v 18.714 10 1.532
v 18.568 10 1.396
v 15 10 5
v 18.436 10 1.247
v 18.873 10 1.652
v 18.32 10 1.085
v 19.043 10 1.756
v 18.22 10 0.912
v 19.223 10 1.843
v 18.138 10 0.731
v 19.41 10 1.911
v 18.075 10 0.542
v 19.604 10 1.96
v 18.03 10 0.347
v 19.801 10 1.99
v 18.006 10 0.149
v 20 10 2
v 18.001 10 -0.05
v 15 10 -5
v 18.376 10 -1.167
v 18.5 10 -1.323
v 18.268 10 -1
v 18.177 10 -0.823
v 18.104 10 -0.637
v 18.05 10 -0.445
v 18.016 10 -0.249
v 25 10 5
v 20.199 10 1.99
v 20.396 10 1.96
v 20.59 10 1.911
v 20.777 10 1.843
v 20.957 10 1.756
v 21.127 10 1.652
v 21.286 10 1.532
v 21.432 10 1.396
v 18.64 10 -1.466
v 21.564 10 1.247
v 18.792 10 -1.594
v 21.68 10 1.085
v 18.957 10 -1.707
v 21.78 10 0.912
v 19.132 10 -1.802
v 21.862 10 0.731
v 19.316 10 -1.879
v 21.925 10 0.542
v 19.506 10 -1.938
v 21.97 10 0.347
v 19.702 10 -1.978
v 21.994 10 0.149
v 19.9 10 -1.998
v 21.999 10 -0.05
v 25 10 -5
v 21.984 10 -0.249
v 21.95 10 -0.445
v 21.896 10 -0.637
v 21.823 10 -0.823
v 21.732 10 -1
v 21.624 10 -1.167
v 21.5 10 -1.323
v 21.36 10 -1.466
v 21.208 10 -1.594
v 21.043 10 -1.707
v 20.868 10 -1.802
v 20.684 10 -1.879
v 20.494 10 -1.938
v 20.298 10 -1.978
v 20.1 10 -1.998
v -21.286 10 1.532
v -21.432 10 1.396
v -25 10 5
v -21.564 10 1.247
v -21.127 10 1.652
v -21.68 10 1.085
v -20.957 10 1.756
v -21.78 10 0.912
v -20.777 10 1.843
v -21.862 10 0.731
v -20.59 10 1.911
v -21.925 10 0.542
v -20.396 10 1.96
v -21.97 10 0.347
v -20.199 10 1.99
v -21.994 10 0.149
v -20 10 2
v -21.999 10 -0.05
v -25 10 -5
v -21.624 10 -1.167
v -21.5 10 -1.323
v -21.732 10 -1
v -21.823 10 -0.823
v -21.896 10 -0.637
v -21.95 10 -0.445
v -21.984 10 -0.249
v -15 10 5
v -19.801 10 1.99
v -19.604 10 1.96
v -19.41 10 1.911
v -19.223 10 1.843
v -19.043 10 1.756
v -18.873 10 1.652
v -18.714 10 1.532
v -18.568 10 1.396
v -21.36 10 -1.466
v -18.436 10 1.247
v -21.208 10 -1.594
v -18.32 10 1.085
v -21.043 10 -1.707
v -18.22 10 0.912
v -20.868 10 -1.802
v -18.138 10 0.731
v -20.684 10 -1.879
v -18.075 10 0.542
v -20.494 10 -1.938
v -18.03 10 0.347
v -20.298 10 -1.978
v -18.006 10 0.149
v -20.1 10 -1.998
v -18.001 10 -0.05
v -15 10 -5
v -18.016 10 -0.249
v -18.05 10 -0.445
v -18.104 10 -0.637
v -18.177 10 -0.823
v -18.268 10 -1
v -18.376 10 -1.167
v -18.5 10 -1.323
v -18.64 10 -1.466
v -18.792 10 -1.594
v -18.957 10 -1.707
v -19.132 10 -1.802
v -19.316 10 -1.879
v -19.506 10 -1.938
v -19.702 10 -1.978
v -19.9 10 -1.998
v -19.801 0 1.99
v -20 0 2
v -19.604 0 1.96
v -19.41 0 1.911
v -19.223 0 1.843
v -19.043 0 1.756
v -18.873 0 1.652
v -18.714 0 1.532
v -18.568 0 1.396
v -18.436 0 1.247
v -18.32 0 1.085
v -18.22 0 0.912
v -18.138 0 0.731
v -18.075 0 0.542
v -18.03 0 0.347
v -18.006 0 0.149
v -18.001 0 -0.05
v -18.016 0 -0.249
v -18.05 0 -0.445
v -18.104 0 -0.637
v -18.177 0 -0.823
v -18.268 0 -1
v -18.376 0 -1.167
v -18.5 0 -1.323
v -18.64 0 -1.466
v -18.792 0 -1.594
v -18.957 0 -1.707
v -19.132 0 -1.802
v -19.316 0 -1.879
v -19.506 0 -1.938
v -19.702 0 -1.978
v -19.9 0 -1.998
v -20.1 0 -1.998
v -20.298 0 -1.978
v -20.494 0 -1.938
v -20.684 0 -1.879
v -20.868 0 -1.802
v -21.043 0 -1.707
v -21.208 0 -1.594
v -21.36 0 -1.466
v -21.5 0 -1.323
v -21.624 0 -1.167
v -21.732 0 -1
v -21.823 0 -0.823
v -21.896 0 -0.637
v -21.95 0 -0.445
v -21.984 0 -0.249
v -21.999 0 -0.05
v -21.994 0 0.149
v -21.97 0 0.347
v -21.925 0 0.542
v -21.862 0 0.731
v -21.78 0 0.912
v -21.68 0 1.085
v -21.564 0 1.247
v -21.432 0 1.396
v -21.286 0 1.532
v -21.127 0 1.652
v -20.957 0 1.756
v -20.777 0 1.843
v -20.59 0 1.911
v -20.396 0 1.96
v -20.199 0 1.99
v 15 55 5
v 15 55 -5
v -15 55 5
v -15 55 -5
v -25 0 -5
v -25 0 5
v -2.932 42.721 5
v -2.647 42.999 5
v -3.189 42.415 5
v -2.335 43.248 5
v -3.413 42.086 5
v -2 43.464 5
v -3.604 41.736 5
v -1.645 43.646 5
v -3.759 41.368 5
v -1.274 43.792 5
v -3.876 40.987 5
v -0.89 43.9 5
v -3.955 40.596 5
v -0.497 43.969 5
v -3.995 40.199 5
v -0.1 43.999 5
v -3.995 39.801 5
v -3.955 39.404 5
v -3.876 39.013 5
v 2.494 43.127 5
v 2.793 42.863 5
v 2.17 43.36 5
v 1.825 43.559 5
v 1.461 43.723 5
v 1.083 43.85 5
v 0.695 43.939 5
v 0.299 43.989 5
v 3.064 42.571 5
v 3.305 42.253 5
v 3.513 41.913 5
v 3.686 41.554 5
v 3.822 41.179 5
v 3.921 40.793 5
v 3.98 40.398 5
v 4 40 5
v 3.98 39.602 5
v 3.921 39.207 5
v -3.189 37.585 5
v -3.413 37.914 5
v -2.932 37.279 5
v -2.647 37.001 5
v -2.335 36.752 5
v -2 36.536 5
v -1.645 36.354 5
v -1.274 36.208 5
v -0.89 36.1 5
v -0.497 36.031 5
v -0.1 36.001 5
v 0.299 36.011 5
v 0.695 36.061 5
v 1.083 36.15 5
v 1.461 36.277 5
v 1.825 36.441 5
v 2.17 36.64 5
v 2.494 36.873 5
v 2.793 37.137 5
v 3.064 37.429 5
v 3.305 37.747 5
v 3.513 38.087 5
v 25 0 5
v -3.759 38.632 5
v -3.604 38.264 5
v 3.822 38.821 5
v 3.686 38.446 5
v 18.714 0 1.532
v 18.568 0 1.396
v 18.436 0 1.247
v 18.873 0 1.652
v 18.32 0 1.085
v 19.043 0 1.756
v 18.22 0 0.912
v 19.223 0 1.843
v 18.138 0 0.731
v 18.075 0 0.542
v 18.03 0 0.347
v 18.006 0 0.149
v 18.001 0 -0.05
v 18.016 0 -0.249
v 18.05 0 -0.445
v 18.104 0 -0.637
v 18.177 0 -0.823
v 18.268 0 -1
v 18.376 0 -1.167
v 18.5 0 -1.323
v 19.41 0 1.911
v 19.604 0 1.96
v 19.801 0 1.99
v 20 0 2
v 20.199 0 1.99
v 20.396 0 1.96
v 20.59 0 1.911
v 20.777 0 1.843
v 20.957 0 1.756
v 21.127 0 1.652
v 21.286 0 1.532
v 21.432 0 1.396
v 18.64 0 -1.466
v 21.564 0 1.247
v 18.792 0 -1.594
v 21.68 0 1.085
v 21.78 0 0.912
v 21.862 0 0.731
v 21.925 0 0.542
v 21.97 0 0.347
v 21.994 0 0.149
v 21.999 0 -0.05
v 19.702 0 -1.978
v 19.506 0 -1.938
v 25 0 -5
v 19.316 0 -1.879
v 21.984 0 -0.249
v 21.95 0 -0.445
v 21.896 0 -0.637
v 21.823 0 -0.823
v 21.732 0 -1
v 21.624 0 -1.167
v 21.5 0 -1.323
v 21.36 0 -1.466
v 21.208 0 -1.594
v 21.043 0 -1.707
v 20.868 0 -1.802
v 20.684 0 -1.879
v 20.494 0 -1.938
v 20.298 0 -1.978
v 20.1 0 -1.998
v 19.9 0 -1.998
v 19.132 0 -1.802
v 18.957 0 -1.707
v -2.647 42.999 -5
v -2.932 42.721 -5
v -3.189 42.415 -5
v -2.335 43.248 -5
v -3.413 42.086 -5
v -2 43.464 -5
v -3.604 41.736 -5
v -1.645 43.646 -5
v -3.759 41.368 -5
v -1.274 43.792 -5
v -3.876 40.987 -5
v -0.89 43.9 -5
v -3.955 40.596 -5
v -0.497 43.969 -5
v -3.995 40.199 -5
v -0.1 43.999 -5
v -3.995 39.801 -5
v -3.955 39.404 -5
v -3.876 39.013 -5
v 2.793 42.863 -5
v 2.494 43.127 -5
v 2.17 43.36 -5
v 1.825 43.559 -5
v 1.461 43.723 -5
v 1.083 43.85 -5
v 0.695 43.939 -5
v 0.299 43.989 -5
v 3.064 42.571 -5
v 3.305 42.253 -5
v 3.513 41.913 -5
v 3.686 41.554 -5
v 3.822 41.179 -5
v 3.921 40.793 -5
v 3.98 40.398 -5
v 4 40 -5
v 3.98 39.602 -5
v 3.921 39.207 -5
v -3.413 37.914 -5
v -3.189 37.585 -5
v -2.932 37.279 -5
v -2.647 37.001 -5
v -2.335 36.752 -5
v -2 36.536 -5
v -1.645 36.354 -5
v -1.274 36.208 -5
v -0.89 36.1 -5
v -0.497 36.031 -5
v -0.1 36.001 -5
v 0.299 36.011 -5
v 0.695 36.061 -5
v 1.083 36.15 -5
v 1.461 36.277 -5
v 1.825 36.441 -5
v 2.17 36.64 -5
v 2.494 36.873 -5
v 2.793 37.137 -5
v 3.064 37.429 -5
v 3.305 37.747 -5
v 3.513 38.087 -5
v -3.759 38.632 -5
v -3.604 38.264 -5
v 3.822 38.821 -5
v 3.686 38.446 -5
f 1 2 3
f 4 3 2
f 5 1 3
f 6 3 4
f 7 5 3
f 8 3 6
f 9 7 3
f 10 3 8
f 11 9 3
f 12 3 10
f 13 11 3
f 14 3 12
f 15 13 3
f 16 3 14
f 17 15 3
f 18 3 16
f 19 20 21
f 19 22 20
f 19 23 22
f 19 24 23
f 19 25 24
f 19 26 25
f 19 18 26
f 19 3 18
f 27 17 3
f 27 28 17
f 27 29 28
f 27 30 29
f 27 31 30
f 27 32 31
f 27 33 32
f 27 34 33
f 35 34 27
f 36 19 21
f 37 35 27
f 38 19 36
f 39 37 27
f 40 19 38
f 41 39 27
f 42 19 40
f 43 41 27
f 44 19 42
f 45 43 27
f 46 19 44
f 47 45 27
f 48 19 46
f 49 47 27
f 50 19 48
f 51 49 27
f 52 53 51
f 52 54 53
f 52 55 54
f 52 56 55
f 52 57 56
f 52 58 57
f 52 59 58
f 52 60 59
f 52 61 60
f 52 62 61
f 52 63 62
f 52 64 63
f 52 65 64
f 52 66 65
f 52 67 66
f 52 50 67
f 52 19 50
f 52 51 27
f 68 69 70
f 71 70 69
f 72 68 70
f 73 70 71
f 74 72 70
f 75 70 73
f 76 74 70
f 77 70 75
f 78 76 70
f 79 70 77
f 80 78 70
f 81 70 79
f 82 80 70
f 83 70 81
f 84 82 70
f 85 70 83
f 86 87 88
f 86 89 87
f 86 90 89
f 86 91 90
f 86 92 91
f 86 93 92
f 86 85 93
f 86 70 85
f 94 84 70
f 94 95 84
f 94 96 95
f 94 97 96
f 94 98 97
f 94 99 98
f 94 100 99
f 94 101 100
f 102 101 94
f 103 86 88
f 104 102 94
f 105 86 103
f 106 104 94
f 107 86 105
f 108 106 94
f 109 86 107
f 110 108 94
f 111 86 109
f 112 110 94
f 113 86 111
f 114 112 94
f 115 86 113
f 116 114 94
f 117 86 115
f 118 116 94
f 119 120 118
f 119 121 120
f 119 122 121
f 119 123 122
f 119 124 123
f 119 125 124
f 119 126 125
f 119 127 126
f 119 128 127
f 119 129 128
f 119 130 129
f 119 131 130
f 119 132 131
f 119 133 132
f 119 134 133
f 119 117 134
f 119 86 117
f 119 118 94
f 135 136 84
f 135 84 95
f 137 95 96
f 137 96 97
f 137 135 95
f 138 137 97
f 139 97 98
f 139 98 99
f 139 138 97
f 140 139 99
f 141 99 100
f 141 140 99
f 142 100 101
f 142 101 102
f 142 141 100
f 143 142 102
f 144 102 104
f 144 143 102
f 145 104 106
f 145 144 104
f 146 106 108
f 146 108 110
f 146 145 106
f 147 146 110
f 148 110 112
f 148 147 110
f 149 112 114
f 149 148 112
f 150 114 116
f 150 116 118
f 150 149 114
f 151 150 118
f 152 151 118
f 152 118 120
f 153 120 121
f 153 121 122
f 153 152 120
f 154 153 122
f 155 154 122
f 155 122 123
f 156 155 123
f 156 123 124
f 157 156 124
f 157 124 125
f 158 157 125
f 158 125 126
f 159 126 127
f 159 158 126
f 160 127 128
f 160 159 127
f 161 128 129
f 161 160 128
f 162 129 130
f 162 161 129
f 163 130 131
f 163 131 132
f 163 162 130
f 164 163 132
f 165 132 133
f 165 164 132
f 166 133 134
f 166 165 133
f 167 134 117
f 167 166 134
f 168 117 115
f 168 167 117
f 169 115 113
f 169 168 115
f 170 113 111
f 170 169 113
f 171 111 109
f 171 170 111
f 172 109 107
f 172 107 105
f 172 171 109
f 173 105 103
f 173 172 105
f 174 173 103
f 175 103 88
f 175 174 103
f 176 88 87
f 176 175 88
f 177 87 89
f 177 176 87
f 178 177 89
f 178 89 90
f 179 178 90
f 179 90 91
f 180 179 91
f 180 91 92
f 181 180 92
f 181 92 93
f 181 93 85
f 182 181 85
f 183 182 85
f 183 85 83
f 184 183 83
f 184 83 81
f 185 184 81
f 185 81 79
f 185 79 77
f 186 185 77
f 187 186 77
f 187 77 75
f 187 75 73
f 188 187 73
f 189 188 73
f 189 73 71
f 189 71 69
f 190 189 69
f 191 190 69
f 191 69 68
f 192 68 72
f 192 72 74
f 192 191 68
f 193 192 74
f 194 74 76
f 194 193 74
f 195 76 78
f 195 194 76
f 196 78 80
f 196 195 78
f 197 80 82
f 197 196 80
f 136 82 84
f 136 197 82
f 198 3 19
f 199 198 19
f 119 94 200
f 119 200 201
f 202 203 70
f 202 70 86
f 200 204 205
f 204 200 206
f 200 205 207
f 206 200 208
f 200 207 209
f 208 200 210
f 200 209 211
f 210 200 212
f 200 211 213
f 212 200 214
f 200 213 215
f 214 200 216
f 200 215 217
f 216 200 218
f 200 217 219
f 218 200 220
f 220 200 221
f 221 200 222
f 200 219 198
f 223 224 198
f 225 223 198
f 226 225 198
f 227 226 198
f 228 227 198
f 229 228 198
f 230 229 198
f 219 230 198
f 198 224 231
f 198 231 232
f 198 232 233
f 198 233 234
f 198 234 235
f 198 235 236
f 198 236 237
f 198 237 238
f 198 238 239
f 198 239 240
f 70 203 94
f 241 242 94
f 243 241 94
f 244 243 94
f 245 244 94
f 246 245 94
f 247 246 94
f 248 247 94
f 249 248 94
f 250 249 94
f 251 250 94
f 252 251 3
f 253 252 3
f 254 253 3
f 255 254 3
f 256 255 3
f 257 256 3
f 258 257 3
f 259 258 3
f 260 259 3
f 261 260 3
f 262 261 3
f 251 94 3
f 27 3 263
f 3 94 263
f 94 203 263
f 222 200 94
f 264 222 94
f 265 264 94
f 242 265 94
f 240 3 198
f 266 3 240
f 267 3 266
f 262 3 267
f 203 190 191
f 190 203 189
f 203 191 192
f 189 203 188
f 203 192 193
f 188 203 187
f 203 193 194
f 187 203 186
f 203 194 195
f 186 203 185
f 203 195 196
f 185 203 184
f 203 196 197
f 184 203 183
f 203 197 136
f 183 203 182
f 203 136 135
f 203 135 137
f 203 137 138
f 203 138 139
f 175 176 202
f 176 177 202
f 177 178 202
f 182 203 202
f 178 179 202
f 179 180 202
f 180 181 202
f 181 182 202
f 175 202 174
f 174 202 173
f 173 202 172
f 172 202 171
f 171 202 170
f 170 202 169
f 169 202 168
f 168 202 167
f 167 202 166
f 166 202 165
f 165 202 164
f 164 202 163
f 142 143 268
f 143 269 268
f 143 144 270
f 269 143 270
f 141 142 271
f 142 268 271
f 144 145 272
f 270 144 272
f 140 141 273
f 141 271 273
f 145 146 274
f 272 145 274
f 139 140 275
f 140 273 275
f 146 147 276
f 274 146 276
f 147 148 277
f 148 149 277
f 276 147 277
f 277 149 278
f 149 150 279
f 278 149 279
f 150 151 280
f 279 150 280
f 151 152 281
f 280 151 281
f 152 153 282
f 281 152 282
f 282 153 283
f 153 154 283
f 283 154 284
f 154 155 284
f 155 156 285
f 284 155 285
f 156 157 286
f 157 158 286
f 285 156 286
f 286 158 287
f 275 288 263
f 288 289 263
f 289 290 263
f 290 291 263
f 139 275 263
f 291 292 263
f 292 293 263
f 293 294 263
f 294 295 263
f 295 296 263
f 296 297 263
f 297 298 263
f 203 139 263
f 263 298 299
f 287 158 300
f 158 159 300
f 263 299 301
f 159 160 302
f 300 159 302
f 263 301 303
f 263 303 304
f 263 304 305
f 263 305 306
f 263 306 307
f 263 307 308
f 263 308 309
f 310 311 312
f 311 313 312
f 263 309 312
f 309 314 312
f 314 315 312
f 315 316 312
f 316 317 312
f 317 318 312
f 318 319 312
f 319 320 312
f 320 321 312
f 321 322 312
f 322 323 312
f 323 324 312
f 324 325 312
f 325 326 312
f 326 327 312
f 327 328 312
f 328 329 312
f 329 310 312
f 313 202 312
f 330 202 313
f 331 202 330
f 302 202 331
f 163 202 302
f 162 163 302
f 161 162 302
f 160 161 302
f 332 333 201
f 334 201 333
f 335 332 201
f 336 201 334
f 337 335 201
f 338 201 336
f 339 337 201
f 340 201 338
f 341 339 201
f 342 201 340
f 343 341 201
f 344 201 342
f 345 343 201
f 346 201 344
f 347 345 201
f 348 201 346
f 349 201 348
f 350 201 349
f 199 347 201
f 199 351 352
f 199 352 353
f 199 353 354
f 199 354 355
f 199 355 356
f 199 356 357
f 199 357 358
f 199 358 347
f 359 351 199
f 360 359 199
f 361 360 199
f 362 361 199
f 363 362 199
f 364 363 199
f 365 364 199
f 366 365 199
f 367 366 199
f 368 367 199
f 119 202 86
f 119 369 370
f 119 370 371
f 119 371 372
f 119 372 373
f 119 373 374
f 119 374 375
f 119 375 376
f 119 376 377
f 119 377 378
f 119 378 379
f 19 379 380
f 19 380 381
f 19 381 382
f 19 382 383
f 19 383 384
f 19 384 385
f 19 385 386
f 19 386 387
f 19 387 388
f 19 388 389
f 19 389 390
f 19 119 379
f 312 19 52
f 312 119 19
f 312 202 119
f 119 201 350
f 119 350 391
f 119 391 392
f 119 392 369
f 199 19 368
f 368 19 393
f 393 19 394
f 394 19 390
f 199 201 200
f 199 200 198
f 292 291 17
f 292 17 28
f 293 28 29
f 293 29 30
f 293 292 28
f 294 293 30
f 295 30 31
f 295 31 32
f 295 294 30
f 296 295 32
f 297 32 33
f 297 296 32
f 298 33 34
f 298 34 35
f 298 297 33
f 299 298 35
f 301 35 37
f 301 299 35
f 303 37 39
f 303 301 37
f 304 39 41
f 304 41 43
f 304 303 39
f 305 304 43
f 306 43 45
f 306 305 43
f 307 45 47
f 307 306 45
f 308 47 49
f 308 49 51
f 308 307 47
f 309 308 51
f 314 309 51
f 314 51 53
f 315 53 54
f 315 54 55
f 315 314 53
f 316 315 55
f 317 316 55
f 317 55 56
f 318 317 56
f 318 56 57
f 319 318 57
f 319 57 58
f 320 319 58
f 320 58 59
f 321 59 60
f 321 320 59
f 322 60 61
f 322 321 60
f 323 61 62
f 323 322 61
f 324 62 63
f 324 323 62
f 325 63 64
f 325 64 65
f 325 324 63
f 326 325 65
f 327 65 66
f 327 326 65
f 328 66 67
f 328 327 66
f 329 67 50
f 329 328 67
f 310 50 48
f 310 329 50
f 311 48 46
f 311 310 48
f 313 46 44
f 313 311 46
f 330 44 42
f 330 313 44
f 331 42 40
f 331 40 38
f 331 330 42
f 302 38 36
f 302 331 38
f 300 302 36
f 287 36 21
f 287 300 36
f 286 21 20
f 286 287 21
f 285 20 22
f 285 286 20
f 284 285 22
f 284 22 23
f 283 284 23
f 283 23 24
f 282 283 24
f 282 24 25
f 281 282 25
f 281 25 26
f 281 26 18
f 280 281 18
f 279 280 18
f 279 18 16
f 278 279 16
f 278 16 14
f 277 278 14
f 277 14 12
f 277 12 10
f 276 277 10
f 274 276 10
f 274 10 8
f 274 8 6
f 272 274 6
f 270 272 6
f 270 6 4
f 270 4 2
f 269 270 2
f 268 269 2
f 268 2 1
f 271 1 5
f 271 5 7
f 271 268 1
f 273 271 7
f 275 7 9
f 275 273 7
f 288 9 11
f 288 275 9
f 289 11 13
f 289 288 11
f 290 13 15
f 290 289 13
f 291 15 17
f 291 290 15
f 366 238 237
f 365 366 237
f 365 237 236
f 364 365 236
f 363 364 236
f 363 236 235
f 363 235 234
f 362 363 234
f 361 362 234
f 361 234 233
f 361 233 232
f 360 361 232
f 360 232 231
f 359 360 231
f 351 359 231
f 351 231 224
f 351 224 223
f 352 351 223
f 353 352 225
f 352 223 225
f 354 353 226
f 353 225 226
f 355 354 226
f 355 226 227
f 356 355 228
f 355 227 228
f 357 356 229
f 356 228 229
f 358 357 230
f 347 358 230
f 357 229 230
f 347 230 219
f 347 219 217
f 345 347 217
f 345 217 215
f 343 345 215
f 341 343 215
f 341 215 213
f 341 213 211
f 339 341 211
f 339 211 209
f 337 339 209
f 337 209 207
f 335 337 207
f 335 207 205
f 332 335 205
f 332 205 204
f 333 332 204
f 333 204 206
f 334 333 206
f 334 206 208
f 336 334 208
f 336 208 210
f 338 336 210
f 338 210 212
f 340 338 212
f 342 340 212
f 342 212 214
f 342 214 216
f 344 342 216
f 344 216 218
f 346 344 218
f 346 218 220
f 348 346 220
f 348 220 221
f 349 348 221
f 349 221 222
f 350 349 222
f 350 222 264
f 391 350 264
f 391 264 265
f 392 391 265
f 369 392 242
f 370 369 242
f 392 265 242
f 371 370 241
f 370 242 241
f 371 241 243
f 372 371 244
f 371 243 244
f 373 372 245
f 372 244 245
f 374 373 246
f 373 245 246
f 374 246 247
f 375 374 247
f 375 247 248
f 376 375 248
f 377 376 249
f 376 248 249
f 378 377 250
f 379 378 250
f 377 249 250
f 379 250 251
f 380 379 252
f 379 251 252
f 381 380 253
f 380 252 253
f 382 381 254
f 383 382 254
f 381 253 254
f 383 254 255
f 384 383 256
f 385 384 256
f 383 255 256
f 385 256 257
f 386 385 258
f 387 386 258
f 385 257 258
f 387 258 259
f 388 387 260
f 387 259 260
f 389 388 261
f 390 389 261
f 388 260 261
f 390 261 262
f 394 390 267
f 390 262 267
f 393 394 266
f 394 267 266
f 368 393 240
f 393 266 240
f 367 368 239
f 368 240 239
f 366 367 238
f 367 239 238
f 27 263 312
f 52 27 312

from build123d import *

# Parameters (mm, degrees)
SKETCH1_W           = 50
SKETCH1_H           = 10
SKETCH1_R           = 2
BOSS_EXTRUDE1_DEPTH = 10
SKETCH4_W           = 30
SKETCH4_H           = 10
BOSS_EXTRUDE3_DEPTH = 45
SKETCH5_R           = 4
CUT_EXTRUDE1_DEPTH  = 45


with BuildPart() as part:
    # Sketch1 → Boss-Extrude1 (new body)
    with BuildSketch(Plane(origin=(0, 0, 0), x_dir=(1, 0, 0), z_dir=(0, 1, 0))):
        Rectangle(SKETCH1_W, SKETCH1_H)
        with Locations(Location((-20, 0, 0), (0, 0, 270))):
            Circle(SKETCH1_R, mode=Mode.SUBTRACT)
        with Locations(Location((20, 0, 0), (0, 0, 270))):
            Circle(SKETCH1_R, mode=Mode.SUBTRACT)
    extrude(amount=BOSS_EXTRUDE1_DEPTH)

    # Sketch4 → Boss-Extrude3 (add)
    with BuildSketch(Plane(origin=(0, 10, 0), x_dir=(1, 0, 0), z_dir=(0, 1, 0))):
        Rectangle(SKETCH4_W, SKETCH4_H)
    extrude(amount=BOSS_EXTRUDE3_DEPTH)

    # Sketch5 → Cut-Extrude1 (cut)
    with BuildSketch(Plane.XY.offset(5)):
        with Locations((0, 40)):
            Circle(SKETCH5_R)
    extrude(amount=-CUT_EXTRUDE1_DEPTH, mode=Mode.SUBTRACT)


solid = part.part
